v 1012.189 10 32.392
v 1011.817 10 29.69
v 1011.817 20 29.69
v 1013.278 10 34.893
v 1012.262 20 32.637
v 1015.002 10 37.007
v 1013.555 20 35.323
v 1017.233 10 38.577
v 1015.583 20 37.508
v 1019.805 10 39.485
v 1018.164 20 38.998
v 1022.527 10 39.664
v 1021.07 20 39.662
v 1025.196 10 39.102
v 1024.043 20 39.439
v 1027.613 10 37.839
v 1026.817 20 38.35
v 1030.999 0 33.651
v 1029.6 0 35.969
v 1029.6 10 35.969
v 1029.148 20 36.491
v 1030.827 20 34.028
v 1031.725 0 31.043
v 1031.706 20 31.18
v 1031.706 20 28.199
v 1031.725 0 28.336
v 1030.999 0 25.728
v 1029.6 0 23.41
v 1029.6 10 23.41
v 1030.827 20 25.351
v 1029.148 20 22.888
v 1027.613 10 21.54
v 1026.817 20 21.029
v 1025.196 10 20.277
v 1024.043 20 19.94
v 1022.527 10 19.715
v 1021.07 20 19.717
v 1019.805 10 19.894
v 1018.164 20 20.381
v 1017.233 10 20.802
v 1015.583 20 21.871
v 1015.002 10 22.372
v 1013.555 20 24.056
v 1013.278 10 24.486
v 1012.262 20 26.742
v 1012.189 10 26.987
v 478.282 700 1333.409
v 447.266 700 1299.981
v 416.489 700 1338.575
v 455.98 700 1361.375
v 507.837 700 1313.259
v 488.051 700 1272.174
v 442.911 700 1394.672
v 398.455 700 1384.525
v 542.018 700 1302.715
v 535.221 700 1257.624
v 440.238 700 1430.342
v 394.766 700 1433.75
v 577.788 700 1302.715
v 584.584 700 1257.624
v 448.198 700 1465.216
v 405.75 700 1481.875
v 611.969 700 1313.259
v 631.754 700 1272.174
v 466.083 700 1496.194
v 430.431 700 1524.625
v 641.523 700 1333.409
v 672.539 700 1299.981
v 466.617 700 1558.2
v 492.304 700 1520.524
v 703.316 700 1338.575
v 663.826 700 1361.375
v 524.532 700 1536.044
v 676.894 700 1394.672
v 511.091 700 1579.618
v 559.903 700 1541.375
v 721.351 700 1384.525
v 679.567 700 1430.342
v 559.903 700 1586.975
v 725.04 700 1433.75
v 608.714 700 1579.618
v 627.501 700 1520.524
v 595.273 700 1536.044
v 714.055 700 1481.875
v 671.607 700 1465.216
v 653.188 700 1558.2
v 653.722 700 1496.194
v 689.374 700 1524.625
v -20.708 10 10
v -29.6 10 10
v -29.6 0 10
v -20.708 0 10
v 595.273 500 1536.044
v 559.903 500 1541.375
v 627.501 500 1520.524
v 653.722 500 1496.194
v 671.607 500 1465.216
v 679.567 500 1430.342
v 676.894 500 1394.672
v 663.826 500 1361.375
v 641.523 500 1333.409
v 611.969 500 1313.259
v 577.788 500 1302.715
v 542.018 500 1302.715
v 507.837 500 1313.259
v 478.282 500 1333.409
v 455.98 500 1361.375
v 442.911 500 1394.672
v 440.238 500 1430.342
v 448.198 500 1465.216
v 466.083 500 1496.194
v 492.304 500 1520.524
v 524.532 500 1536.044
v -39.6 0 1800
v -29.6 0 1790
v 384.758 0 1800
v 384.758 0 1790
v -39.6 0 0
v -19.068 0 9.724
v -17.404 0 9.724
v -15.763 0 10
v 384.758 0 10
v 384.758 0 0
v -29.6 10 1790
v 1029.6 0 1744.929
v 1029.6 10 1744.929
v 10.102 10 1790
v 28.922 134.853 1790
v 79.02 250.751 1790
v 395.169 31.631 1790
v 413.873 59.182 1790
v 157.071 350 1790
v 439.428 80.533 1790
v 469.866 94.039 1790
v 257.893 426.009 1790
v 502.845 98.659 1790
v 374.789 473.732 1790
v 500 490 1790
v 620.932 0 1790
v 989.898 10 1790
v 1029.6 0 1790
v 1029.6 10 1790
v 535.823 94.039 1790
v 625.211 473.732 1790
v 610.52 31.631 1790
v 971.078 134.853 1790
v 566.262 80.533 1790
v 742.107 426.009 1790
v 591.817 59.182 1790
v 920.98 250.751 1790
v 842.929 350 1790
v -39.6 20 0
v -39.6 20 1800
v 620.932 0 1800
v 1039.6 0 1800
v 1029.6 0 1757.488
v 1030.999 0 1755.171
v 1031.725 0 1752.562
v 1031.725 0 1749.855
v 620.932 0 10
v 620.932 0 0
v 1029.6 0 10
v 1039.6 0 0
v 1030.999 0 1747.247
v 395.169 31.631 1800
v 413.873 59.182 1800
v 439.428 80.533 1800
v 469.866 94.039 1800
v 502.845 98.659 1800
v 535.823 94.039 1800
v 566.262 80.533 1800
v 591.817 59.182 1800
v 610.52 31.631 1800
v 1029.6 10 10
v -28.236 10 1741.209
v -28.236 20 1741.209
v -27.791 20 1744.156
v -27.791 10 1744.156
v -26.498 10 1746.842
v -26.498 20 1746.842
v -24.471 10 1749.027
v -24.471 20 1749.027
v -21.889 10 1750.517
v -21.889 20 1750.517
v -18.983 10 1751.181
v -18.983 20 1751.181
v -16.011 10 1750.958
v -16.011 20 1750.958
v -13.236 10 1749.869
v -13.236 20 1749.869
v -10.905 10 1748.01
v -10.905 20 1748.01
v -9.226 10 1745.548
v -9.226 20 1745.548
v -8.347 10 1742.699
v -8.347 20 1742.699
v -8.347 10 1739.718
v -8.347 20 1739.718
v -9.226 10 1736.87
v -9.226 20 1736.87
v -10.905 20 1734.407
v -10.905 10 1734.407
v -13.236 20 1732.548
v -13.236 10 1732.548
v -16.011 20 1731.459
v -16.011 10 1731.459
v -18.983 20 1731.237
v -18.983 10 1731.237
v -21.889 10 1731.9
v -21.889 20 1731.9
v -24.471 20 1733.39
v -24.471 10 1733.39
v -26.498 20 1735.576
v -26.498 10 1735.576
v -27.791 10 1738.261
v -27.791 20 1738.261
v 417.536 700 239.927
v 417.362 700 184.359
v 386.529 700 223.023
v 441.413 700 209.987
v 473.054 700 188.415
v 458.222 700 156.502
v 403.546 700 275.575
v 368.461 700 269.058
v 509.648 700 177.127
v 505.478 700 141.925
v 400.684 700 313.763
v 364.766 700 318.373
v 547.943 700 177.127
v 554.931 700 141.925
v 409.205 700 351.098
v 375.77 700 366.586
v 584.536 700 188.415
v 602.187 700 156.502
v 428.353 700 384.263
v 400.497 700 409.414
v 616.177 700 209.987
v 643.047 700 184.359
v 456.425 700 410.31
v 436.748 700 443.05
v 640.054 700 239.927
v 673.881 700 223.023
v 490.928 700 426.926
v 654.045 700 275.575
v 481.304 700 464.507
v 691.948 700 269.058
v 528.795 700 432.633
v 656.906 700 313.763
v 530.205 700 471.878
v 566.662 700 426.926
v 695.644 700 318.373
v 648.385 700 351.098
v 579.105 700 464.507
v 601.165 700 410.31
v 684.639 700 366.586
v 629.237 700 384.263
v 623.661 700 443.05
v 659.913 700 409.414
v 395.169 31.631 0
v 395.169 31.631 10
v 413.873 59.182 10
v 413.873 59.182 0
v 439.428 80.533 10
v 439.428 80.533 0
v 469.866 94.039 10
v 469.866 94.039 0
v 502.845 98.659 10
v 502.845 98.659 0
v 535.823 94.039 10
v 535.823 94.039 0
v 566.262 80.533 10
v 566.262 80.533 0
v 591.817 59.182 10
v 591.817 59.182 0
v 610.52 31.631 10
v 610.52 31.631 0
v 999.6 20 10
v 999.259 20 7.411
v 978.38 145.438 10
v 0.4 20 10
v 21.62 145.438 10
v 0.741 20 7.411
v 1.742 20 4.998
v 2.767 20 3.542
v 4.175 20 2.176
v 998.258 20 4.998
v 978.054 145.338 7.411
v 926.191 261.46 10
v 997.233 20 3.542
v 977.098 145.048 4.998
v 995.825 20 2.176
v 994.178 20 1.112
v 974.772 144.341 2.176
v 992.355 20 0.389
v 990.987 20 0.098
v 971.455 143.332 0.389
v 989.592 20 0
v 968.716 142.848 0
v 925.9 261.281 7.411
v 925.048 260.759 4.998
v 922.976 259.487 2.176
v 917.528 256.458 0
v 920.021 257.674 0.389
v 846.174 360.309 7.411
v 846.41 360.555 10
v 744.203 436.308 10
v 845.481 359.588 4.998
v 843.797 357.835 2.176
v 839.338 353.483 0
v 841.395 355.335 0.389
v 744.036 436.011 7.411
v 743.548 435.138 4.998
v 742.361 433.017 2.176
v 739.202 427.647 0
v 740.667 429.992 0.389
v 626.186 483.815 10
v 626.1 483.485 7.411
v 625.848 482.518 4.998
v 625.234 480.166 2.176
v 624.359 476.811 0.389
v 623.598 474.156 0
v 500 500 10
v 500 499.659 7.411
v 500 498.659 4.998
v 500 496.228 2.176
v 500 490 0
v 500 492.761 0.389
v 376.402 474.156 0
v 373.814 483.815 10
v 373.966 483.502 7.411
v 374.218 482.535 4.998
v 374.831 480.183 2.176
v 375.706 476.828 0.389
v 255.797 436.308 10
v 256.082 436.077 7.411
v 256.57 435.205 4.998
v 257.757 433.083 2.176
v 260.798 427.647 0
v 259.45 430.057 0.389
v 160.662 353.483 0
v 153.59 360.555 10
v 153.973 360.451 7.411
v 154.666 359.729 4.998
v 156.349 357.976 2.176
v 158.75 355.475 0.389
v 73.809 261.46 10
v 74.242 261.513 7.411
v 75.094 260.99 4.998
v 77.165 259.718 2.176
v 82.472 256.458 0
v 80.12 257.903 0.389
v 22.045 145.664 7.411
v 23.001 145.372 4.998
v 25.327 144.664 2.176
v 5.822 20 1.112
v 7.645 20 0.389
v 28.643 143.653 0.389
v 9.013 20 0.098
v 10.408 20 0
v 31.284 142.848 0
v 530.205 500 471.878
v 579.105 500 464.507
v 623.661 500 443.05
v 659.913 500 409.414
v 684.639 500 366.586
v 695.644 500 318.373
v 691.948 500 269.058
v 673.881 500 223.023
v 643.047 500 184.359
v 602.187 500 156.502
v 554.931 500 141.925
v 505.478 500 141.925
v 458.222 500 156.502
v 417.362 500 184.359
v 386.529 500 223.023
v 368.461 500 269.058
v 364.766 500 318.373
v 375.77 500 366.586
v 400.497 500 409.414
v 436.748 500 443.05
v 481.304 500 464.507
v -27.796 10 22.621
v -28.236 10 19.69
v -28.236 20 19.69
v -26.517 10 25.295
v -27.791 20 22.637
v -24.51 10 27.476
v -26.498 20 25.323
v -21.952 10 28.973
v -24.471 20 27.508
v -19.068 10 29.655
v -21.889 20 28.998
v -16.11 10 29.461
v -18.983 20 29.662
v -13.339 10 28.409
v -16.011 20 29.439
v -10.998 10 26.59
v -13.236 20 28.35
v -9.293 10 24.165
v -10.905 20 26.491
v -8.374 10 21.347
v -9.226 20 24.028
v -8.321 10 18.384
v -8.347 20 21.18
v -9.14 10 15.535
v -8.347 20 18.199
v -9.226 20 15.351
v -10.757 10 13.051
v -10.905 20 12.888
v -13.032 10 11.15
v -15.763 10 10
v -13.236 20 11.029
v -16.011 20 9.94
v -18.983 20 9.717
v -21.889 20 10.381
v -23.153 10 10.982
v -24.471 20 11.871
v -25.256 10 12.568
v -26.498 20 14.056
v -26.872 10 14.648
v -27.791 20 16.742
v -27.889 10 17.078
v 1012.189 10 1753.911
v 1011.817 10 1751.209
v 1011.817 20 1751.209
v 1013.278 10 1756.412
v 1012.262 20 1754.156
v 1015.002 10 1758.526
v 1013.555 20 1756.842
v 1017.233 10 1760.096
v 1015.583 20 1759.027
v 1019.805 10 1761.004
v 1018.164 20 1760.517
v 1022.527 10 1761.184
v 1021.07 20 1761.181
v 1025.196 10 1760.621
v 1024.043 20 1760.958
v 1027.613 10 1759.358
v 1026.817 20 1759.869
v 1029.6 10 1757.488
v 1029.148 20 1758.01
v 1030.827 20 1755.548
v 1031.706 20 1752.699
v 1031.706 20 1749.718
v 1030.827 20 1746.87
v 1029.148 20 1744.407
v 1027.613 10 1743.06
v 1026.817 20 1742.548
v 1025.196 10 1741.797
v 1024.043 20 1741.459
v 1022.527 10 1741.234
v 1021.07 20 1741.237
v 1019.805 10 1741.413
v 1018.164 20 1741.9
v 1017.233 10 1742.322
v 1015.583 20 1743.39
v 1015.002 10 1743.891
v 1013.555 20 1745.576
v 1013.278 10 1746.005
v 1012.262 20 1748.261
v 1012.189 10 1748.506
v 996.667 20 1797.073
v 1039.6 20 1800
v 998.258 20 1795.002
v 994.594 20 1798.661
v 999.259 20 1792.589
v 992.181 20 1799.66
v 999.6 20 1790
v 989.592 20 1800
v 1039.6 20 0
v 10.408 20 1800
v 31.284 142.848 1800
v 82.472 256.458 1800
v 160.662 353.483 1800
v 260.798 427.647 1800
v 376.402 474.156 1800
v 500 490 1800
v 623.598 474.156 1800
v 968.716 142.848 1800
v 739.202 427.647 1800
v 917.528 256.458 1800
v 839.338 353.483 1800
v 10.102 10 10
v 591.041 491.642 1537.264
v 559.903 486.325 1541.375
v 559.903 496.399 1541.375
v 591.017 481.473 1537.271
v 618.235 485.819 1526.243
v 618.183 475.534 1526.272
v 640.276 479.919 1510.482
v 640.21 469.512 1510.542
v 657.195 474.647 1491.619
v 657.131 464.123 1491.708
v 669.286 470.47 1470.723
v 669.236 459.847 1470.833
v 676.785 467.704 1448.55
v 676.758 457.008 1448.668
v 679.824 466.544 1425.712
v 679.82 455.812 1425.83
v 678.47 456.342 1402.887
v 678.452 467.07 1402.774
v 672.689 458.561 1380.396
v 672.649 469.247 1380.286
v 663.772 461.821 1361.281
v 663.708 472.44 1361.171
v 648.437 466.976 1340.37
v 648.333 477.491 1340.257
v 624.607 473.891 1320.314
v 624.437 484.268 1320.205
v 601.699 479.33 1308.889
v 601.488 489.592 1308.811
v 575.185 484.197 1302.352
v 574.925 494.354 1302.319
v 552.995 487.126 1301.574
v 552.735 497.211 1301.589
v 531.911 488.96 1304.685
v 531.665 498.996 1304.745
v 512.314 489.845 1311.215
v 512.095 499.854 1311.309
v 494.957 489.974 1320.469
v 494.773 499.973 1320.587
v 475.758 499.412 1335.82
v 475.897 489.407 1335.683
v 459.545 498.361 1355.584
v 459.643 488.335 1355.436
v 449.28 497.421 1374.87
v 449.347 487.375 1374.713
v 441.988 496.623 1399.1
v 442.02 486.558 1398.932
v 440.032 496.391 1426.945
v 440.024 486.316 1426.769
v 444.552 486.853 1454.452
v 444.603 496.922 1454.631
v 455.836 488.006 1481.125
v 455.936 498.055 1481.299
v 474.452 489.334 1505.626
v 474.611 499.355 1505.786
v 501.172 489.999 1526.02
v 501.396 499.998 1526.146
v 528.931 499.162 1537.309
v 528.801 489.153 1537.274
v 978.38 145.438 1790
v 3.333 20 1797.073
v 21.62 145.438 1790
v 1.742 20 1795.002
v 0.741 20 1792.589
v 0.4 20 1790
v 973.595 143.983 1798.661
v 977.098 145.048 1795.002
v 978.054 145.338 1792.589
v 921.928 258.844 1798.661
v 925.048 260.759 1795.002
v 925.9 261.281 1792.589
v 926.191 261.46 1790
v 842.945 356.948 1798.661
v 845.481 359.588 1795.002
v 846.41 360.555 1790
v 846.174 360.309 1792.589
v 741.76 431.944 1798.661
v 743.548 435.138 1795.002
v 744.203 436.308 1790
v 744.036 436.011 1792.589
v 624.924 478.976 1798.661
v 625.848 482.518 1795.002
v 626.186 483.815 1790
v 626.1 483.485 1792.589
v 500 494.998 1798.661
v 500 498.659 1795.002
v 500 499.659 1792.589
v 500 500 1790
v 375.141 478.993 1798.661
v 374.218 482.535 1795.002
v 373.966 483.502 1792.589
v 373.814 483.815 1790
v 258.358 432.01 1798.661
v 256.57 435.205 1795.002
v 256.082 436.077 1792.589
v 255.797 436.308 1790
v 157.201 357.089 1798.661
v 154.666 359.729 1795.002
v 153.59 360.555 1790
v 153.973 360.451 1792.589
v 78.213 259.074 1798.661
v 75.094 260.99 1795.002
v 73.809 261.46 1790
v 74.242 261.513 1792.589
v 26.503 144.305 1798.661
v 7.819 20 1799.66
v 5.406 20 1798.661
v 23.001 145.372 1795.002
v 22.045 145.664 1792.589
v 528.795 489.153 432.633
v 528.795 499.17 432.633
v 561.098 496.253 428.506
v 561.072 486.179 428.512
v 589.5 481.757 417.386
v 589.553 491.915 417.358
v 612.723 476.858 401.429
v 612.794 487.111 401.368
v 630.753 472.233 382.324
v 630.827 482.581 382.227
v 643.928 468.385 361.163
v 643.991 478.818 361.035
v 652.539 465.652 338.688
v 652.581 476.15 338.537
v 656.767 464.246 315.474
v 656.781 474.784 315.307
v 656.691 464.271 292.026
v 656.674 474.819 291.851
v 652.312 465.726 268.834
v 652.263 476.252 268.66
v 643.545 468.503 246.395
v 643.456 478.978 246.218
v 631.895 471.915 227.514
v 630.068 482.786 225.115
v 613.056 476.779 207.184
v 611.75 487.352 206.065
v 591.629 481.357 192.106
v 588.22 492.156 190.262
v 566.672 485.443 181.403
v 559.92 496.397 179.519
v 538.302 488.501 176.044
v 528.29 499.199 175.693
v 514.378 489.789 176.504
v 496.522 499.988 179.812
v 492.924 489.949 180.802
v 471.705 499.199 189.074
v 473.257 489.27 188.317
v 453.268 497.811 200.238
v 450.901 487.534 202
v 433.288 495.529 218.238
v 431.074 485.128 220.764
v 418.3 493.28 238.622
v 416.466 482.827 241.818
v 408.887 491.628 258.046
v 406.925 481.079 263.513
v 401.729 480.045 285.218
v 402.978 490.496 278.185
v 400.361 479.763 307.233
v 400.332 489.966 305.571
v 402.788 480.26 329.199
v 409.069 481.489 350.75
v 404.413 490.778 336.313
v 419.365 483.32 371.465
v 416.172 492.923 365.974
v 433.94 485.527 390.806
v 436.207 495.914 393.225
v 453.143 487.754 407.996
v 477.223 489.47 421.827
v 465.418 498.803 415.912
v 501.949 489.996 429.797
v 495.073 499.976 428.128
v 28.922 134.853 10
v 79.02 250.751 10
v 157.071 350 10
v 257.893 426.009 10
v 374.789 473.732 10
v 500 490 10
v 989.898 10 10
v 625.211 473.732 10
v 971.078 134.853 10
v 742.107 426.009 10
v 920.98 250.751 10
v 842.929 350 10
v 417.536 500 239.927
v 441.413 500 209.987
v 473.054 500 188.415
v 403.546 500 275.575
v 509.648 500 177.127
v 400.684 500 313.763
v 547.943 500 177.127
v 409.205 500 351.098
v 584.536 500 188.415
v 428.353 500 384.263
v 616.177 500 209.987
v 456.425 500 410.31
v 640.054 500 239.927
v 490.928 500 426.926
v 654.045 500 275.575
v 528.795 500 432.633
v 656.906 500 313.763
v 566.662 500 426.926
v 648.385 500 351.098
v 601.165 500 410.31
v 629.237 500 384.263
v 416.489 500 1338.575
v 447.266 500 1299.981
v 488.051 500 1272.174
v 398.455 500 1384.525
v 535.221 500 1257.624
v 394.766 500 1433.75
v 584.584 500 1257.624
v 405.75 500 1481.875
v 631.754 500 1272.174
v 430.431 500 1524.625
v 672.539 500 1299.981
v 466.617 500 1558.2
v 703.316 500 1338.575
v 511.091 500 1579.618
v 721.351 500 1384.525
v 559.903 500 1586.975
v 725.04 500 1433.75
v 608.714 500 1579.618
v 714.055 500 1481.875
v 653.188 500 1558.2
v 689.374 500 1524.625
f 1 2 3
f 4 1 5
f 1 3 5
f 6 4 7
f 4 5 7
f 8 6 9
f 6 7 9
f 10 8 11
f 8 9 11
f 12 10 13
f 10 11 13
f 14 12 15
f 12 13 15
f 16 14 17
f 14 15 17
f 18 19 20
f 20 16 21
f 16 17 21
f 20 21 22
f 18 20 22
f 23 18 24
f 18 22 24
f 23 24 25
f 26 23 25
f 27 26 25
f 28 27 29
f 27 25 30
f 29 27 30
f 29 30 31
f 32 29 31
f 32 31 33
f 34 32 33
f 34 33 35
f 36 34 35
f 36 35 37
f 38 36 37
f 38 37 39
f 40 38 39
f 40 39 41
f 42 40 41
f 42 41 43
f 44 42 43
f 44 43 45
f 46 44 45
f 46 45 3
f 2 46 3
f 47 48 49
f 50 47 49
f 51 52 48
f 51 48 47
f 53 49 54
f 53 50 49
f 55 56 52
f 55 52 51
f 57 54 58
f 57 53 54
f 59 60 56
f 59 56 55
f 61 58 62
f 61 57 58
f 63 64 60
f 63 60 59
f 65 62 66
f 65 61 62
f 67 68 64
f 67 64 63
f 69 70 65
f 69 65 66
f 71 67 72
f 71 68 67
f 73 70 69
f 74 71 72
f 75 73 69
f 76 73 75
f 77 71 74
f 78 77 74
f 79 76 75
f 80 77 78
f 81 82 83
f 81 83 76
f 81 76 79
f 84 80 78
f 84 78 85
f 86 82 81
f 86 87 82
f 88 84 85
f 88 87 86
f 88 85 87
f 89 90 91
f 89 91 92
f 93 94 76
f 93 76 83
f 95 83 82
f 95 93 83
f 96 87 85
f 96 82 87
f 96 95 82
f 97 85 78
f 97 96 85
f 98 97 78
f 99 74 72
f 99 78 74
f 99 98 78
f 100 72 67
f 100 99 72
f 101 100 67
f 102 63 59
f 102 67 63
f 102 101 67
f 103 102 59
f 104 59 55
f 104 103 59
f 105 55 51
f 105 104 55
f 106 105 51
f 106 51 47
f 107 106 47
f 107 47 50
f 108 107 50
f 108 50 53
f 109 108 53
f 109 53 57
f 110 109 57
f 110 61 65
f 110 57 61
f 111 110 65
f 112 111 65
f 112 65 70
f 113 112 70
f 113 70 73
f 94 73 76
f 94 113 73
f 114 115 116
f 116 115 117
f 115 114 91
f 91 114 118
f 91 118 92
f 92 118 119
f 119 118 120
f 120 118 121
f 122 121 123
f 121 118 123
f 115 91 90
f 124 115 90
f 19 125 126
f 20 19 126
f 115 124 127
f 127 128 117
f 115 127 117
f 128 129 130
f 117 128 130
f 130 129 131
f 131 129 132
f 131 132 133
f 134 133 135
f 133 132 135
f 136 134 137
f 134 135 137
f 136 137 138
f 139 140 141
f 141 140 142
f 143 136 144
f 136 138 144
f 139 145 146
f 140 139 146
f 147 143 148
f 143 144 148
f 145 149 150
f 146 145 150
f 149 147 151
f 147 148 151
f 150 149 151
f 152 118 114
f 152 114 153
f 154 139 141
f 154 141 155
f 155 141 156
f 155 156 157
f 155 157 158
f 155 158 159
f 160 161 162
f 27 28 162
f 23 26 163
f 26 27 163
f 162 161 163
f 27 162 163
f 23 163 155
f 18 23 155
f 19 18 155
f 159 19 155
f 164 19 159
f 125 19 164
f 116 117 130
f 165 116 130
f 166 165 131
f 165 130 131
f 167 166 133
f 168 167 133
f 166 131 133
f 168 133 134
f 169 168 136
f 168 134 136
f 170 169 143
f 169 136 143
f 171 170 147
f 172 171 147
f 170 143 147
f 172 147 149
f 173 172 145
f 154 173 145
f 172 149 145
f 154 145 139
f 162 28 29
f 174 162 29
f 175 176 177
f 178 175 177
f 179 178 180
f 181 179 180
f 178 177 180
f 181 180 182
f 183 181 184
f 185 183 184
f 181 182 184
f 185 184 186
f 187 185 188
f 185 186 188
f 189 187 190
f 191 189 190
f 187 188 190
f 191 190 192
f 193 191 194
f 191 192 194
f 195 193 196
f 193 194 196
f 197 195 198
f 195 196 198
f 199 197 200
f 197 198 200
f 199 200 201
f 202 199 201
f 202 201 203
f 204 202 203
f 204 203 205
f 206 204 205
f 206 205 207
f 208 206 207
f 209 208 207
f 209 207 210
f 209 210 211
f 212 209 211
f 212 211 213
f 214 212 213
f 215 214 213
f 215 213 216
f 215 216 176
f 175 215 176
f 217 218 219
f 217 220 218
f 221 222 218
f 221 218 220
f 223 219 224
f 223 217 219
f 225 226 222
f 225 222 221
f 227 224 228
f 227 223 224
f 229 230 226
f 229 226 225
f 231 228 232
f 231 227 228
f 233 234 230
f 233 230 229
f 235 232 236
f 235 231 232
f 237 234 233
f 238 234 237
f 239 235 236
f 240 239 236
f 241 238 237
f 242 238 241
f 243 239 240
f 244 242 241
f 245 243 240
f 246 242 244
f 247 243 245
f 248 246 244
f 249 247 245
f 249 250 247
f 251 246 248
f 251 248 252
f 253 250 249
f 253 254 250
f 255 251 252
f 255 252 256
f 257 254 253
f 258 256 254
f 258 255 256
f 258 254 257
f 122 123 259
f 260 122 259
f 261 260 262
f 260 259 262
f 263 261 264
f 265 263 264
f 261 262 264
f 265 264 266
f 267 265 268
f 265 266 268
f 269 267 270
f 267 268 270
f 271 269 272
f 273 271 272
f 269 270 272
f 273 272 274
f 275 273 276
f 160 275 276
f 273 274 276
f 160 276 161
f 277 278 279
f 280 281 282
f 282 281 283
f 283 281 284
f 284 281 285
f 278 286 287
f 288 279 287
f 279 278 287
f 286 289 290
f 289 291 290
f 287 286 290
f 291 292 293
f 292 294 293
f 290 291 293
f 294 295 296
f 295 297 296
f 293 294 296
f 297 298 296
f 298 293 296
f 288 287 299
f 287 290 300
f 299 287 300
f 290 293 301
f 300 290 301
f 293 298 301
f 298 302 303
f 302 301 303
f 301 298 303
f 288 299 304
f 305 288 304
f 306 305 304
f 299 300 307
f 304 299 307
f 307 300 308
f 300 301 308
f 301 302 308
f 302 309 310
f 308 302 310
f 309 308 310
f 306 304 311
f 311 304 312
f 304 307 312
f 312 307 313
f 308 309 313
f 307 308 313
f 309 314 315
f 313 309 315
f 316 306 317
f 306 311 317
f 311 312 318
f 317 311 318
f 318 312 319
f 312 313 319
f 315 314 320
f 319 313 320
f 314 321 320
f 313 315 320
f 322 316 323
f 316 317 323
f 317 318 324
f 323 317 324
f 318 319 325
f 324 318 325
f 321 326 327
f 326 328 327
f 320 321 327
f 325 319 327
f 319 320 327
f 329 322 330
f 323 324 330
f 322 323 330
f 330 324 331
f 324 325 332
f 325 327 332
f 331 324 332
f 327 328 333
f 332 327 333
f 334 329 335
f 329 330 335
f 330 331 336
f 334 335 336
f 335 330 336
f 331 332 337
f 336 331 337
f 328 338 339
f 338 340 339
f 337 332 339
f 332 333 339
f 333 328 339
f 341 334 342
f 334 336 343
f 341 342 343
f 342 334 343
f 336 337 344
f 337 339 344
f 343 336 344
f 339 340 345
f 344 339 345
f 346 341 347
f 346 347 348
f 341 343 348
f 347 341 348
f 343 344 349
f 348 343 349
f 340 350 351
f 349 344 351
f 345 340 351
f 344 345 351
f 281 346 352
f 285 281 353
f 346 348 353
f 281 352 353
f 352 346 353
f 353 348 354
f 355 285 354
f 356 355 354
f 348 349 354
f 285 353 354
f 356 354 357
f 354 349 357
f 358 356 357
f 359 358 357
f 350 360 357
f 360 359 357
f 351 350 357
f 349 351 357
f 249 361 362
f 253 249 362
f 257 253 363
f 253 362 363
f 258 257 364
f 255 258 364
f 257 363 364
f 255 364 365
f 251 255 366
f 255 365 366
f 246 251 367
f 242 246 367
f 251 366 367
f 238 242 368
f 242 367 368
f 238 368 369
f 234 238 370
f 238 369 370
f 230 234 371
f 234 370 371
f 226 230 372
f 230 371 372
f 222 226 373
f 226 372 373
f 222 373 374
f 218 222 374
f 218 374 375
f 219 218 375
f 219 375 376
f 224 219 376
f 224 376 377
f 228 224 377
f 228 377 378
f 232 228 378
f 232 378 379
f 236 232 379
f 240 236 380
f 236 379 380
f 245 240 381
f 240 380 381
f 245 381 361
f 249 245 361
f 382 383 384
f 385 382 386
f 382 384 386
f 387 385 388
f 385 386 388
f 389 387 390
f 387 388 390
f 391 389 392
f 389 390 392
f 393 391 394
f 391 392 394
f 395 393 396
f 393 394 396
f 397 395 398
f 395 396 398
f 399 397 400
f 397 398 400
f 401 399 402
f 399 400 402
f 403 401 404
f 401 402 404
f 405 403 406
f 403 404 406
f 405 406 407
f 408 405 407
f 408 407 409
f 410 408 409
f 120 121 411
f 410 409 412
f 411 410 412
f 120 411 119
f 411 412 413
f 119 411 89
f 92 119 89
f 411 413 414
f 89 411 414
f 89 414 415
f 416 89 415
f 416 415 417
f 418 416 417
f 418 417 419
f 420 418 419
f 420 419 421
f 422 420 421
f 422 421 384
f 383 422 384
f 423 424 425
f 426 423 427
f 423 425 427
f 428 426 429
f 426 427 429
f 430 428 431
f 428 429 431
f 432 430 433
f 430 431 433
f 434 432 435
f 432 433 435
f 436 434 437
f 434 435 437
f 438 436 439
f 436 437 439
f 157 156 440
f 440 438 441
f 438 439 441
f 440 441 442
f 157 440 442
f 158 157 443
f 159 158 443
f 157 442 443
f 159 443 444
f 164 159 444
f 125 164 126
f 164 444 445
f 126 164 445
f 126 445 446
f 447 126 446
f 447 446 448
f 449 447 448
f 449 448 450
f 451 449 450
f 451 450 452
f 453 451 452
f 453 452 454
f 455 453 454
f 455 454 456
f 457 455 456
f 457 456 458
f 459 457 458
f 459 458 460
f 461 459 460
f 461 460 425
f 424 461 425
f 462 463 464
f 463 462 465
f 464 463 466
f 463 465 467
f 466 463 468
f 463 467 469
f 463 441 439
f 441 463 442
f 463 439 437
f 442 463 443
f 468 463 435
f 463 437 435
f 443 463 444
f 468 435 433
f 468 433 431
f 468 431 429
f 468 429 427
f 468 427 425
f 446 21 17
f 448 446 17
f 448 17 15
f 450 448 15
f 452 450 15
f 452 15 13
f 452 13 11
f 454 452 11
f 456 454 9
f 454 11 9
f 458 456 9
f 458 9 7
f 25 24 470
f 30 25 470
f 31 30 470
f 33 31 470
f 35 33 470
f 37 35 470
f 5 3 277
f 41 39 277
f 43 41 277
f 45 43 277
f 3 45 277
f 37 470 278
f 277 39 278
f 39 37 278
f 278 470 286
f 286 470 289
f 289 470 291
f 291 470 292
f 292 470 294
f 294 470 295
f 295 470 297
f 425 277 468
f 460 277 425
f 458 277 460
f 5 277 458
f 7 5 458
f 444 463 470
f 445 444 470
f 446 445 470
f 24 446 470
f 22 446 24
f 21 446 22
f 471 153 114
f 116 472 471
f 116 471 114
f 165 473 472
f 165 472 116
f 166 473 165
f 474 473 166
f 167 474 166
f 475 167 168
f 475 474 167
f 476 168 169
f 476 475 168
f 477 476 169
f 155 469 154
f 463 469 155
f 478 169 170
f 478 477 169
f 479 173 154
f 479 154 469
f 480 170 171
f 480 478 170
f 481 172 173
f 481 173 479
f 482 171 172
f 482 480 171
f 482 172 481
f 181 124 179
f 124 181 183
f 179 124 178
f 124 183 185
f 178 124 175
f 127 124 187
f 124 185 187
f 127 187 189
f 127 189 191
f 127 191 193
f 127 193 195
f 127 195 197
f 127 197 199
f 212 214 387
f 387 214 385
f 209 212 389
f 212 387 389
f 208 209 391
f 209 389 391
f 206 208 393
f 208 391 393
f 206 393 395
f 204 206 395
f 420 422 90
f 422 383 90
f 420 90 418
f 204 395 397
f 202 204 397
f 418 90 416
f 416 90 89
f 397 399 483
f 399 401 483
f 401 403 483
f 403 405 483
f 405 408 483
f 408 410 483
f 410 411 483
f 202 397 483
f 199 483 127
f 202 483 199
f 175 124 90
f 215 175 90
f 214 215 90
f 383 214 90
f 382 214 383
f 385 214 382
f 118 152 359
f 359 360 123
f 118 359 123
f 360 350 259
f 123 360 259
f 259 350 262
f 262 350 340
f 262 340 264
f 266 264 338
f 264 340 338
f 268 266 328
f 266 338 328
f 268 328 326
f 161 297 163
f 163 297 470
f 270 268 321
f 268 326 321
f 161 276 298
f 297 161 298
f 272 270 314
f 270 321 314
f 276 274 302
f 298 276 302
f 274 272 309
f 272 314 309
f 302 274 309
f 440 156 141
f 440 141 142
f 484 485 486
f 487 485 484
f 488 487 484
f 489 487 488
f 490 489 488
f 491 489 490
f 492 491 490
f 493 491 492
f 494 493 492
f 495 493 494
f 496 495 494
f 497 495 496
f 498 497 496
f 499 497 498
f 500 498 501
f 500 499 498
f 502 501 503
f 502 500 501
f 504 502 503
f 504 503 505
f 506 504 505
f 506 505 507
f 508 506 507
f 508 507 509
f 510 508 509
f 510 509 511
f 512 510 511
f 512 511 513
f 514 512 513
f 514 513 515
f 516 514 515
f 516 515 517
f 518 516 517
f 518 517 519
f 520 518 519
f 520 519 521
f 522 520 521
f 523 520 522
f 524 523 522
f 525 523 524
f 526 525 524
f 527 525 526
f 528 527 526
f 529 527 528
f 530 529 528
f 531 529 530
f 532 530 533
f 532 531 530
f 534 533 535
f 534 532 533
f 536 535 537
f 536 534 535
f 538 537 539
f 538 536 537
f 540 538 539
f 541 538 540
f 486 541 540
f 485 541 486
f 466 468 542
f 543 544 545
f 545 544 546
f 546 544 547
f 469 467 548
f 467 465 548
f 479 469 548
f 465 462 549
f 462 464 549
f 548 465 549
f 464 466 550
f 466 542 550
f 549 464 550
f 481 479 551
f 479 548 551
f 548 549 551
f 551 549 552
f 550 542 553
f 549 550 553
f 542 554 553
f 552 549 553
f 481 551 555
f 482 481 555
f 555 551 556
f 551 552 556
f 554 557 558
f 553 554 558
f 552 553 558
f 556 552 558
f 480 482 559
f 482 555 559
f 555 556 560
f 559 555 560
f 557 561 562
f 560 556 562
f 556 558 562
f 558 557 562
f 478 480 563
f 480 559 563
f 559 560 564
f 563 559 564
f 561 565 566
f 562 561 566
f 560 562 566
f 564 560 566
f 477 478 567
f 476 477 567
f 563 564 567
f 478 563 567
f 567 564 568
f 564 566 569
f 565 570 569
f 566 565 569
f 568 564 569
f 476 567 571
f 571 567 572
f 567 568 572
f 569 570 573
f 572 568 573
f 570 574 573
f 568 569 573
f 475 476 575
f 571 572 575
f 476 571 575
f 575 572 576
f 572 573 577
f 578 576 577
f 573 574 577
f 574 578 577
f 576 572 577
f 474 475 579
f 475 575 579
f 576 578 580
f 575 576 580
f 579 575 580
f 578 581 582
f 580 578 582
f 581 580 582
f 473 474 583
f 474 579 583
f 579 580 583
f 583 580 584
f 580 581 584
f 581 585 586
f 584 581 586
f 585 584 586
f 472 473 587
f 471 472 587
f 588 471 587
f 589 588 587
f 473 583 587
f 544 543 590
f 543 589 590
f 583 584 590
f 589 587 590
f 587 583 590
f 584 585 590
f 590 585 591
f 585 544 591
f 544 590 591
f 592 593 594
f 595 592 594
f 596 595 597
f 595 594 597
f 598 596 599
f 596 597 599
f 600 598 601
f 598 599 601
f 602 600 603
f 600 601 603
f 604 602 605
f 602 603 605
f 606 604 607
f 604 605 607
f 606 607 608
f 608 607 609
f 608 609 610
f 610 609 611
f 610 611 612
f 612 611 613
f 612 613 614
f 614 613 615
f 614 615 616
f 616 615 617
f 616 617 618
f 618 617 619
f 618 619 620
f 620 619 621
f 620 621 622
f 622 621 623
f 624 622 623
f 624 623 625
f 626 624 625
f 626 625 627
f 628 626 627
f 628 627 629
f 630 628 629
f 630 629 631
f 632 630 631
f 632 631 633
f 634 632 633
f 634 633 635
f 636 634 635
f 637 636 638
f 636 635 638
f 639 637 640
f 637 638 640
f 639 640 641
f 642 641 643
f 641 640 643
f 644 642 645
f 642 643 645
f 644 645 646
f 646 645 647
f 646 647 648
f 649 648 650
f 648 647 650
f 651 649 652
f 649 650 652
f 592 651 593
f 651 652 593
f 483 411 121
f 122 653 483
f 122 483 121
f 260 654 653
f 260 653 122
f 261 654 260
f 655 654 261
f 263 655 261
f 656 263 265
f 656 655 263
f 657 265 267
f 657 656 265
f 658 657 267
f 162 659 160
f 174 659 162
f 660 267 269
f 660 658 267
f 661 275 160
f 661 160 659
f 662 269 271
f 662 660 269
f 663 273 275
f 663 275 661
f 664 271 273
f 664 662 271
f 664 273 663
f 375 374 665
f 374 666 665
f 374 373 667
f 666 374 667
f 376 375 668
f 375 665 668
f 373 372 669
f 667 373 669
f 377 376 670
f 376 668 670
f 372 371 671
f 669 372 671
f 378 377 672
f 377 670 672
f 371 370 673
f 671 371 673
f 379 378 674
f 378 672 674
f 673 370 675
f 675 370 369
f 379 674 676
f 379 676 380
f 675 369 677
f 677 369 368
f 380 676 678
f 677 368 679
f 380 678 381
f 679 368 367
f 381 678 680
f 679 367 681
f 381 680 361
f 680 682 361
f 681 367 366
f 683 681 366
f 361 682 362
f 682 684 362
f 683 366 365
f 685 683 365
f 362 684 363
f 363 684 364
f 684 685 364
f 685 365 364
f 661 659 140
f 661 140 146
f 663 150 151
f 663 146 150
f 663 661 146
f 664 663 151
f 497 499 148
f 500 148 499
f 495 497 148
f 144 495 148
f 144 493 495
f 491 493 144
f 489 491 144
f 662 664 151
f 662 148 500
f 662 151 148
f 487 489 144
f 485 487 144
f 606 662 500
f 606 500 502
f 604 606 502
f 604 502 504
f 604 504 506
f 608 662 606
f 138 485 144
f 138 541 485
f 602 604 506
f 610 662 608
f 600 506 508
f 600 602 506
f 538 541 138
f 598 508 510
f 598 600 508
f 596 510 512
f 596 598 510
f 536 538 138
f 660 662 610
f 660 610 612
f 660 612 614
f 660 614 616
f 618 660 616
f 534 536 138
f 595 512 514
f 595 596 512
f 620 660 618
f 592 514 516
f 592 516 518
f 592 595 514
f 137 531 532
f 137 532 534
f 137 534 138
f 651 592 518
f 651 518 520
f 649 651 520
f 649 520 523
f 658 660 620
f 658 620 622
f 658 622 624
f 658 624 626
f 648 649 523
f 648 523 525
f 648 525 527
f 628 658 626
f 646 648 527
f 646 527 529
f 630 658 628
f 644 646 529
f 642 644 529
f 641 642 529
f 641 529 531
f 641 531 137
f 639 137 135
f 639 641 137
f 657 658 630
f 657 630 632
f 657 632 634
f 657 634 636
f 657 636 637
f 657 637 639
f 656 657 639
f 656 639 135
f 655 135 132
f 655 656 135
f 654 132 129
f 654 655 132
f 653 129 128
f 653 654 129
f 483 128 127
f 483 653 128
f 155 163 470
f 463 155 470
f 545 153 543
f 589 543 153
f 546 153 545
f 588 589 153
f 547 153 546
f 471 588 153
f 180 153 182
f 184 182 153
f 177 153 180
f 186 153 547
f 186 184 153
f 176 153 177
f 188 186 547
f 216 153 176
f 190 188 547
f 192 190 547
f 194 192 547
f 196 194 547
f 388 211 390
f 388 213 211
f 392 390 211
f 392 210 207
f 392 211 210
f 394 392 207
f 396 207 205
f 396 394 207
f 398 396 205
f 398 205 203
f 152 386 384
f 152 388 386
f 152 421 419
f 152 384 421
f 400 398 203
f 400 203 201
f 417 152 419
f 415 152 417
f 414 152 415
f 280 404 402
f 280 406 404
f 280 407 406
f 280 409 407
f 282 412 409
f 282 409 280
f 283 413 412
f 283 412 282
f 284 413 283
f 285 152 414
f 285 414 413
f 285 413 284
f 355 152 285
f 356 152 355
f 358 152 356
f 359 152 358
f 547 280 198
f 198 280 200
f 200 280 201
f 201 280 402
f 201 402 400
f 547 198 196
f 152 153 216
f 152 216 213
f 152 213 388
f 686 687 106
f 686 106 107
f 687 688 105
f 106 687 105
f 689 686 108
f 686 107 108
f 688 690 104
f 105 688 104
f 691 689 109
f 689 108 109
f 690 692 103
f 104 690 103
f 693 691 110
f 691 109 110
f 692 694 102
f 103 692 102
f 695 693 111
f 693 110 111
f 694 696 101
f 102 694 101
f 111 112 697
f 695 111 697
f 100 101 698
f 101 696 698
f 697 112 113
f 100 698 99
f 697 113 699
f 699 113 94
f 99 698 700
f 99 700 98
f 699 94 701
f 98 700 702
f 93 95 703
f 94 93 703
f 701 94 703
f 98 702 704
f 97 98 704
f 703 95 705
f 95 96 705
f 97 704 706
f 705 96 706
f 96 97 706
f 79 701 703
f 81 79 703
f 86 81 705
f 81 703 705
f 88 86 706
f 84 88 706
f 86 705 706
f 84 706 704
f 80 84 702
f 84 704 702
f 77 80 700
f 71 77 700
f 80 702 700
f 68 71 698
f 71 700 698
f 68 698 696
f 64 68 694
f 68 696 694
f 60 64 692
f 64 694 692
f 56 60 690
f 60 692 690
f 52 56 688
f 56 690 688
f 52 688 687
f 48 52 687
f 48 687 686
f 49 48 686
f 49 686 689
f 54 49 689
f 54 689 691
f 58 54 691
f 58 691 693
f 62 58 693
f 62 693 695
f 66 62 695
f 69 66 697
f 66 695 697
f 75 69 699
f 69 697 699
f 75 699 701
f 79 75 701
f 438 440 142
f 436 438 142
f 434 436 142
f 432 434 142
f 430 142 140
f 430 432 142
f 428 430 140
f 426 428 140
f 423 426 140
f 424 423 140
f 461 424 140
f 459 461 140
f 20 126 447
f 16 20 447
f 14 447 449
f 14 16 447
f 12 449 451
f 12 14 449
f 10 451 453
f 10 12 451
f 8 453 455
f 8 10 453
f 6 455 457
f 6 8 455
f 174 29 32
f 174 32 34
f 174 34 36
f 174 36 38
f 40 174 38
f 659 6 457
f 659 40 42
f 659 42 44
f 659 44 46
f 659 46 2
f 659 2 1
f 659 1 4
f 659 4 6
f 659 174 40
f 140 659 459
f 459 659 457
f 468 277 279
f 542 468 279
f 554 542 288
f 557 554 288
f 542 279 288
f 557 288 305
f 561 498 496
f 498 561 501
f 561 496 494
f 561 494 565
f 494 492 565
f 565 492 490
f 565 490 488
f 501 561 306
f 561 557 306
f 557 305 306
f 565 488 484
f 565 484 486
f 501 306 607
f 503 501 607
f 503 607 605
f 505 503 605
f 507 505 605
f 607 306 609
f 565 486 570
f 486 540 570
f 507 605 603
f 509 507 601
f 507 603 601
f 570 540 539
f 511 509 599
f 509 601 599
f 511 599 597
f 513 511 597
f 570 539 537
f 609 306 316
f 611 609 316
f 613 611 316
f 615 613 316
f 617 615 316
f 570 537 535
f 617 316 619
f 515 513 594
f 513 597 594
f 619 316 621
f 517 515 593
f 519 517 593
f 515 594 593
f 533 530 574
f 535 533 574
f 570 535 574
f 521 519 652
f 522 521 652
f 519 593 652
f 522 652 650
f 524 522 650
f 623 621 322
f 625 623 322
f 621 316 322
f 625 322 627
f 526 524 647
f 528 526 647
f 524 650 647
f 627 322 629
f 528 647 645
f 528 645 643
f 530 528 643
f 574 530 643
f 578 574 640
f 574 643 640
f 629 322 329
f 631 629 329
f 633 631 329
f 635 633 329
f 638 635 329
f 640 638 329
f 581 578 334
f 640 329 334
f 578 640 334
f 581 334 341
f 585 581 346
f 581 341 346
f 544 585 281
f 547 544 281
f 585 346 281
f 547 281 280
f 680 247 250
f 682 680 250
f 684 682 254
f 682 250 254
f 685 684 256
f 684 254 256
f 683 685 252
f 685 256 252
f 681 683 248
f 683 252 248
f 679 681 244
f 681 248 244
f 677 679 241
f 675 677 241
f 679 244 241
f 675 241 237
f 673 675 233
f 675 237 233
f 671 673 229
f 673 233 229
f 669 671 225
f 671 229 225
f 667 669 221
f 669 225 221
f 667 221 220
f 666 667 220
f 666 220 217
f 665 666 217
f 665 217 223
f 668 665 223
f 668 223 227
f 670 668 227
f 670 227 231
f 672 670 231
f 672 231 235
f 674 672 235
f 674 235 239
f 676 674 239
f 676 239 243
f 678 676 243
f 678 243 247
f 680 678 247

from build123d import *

# Parameters (mm, degrees)
BOSS_EXTRUDE1_DEPTH = 1800
BOSS_EXTRUDE2_DEPTH = 1800
SHELL1_T            = -10
FILLET1_R           = 10
SKETCH3_R           = 10
CUT_EXTRUDE1_DEPTH  = 2134.346626248
SKETCH5_R           = 165.902804936
BOSS_EXTRUDE3_DEPTH = 200
SKETCH6_R           = 128.470522562
CUT_EXTRUDE2_DEPTH  = 2194.346262593
SKETCH7_R           = 165.6
BOSS_EXTRUDE4_DEPTH = 200
SKETCH8_R           = 120
CUT_EXTRUDE5_DEPTH  = 2194.346262593


with BuildPart() as part:
    # Sketch1 → Boss-Extrude1 (new body)
    with BuildSketch(Plane.XY):
        with BuildLine():
            Line((0, 0), (384.757529665, 0))
            ThreePointArc((384.757529665, 0), (502.844648307, 98.659137532), (620.931766949, 0))
            Line((620.931766949, 0), (1000, 0))
            ThreePointArc((1000, 0), (500, 500), (0, 0))
        make_face()
    extrude(amount=BOSS_EXTRUDE1_DEPTH)

    # Sketch2 → Boss-Extrude2 (add)
    with BuildSketch(Plane.XY):
        Polygon((1000, 0), (1039.599839872, 0), (1039.599839872, 20), (999.599839872, 20), align=None)
        Polygon((0, 0), (-39.599839872, 0), (-39.599839872, 20), (0.400160128, 20), align=None)
    extrude(amount=BOSS_EXTRUDE2_DEPTH)

    # Shell1
    shell1_openings = [part.faces().sort_by_distance(p)[0] for p in [
        (830.265803411, 0, 900),
        (502.844648307, 98.659137532, 900),
        (172.578844897, 0, 900),
    ]]
    offset(amount=SHELL1_T, openings=shell1_openings, kind=Kind.INTERSECTION)

    # Fillet1
    fillet1_edges = [part.edges().sort_by_distance(p)[0] for p in [
        (500, 500, 0),
        (500, 500, 1800),
    ]]
    fillet(fillet1_edges, radius=FILLET1_R)

    # Sketch3 → Cut-Extrude1 (cut, through all)
    with BuildSketch(Plane(origin=(0, 20, 0), x_dir=(1, 0, 0), z_dir=(0, 1, 0))):
        with Locations(Location((-18.235719302, -19.68953089, 0), (0, 0, 180))):
            Circle(SKETCH3_R)
        with Locations(Location((1021.817467904, -29.68953089, 0), (0, 0, 180))):
            Circle(SKETCH3_R)
        with Locations(Location((1021.817467904, -1751.208740349, 0), (0, 0, 180))):
            Circle(SKETCH3_R)
        with Locations(Location((-18.235719302, -1741.208740349, 0), (0, 0, 180))):
            Circle(SKETCH3_R)
    extrude(amount=-CUT_EXTRUDE1_DEPTH, mode=Mode.SUBTRACT)


with BuildPart() as body_2:
    # Sketch5 → Boss-Extrude3 (new body)
    with BuildSketch(Plane(origin=(0, 500, 0), x_dir=(1, 0, 0), z_dir=(0, 1, 0))):
        with Locations(Location((530.204668314, -305.974856492, 0), (0, 0, 270))):
            Circle(SKETCH5_R)
    extrude(amount=BOSS_EXTRUDE3_DEPTH)


with BuildPart() as cut_extrude2_tool:
    # Sketch6 → Cut-Extrude2 (new, through all)
    with BuildSketch(Plane(origin=(0, 700, 0), x_dir=(1, 0, 0), z_dir=(0, 1, 0))):
        with Locations(Location((528.795117126, -304.162576394, 0), (0, 0, 270))):
            Circle(SKETCH6_R)
    extrude(amount=-CUT_EXTRUDE2_DEPTH)


with BuildPart() as part_1:
    add(part.part)

    # Cut-Extrude2: cut by cut_extrude2_tool
    add(cut_extrude2_tool.part, mode=Mode.SUBTRACT)


with BuildPart() as body_2_1:
    add(body_2.part)

    # Cut-Extrude2: cut by cut_extrude2_tool
    add(cut_extrude2_tool.part, mode=Mode.SUBTRACT)


with BuildPart() as body_3:
    # Sketch7 → Boss-Extrude4 (new body)
    with BuildSketch(Plane(origin=(0, 500, 0), x_dir=(1, 0, 0), z_dir=(0, 1, 0))):
        with Locations(Location((559.902645938, -1421.374881312, 0), (0, 0, 270))):
            Circle(SKETCH7_R)
    extrude(amount=BOSS_EXTRUDE4_DEPTH)


with BuildPart() as cut_extrude5_tool:
    # Sketch8 → Cut-Extrude5 (new, through all)
    with BuildSketch(Plane(origin=(0, 0, 0), x_dir=(1, 0, 0), z_dir=(0, 1, 0))):
        with Locations(Location((559.902645938, -1421.374881312, 0), (0, 0, 270))):
            Circle(SKETCH8_R)
    extrude(amount=CUT_EXTRUDE5_DEPTH)


with BuildPart() as part_2:
    add(part_1.part)

    # Cut-Extrude5: cut by cut_extrude5_tool
    add(cut_extrude5_tool.part, mode=Mode.SUBTRACT)


with BuildPart() as body_3_1:
    add(body_3.part)

    # Cut-Extrude5: cut by cut_extrude5_tool
    add(cut_extrude5_tool.part, mode=Mode.SUBTRACT)


solid = Compound([body_2_1.part, part_2.part, body_3_1.part])
